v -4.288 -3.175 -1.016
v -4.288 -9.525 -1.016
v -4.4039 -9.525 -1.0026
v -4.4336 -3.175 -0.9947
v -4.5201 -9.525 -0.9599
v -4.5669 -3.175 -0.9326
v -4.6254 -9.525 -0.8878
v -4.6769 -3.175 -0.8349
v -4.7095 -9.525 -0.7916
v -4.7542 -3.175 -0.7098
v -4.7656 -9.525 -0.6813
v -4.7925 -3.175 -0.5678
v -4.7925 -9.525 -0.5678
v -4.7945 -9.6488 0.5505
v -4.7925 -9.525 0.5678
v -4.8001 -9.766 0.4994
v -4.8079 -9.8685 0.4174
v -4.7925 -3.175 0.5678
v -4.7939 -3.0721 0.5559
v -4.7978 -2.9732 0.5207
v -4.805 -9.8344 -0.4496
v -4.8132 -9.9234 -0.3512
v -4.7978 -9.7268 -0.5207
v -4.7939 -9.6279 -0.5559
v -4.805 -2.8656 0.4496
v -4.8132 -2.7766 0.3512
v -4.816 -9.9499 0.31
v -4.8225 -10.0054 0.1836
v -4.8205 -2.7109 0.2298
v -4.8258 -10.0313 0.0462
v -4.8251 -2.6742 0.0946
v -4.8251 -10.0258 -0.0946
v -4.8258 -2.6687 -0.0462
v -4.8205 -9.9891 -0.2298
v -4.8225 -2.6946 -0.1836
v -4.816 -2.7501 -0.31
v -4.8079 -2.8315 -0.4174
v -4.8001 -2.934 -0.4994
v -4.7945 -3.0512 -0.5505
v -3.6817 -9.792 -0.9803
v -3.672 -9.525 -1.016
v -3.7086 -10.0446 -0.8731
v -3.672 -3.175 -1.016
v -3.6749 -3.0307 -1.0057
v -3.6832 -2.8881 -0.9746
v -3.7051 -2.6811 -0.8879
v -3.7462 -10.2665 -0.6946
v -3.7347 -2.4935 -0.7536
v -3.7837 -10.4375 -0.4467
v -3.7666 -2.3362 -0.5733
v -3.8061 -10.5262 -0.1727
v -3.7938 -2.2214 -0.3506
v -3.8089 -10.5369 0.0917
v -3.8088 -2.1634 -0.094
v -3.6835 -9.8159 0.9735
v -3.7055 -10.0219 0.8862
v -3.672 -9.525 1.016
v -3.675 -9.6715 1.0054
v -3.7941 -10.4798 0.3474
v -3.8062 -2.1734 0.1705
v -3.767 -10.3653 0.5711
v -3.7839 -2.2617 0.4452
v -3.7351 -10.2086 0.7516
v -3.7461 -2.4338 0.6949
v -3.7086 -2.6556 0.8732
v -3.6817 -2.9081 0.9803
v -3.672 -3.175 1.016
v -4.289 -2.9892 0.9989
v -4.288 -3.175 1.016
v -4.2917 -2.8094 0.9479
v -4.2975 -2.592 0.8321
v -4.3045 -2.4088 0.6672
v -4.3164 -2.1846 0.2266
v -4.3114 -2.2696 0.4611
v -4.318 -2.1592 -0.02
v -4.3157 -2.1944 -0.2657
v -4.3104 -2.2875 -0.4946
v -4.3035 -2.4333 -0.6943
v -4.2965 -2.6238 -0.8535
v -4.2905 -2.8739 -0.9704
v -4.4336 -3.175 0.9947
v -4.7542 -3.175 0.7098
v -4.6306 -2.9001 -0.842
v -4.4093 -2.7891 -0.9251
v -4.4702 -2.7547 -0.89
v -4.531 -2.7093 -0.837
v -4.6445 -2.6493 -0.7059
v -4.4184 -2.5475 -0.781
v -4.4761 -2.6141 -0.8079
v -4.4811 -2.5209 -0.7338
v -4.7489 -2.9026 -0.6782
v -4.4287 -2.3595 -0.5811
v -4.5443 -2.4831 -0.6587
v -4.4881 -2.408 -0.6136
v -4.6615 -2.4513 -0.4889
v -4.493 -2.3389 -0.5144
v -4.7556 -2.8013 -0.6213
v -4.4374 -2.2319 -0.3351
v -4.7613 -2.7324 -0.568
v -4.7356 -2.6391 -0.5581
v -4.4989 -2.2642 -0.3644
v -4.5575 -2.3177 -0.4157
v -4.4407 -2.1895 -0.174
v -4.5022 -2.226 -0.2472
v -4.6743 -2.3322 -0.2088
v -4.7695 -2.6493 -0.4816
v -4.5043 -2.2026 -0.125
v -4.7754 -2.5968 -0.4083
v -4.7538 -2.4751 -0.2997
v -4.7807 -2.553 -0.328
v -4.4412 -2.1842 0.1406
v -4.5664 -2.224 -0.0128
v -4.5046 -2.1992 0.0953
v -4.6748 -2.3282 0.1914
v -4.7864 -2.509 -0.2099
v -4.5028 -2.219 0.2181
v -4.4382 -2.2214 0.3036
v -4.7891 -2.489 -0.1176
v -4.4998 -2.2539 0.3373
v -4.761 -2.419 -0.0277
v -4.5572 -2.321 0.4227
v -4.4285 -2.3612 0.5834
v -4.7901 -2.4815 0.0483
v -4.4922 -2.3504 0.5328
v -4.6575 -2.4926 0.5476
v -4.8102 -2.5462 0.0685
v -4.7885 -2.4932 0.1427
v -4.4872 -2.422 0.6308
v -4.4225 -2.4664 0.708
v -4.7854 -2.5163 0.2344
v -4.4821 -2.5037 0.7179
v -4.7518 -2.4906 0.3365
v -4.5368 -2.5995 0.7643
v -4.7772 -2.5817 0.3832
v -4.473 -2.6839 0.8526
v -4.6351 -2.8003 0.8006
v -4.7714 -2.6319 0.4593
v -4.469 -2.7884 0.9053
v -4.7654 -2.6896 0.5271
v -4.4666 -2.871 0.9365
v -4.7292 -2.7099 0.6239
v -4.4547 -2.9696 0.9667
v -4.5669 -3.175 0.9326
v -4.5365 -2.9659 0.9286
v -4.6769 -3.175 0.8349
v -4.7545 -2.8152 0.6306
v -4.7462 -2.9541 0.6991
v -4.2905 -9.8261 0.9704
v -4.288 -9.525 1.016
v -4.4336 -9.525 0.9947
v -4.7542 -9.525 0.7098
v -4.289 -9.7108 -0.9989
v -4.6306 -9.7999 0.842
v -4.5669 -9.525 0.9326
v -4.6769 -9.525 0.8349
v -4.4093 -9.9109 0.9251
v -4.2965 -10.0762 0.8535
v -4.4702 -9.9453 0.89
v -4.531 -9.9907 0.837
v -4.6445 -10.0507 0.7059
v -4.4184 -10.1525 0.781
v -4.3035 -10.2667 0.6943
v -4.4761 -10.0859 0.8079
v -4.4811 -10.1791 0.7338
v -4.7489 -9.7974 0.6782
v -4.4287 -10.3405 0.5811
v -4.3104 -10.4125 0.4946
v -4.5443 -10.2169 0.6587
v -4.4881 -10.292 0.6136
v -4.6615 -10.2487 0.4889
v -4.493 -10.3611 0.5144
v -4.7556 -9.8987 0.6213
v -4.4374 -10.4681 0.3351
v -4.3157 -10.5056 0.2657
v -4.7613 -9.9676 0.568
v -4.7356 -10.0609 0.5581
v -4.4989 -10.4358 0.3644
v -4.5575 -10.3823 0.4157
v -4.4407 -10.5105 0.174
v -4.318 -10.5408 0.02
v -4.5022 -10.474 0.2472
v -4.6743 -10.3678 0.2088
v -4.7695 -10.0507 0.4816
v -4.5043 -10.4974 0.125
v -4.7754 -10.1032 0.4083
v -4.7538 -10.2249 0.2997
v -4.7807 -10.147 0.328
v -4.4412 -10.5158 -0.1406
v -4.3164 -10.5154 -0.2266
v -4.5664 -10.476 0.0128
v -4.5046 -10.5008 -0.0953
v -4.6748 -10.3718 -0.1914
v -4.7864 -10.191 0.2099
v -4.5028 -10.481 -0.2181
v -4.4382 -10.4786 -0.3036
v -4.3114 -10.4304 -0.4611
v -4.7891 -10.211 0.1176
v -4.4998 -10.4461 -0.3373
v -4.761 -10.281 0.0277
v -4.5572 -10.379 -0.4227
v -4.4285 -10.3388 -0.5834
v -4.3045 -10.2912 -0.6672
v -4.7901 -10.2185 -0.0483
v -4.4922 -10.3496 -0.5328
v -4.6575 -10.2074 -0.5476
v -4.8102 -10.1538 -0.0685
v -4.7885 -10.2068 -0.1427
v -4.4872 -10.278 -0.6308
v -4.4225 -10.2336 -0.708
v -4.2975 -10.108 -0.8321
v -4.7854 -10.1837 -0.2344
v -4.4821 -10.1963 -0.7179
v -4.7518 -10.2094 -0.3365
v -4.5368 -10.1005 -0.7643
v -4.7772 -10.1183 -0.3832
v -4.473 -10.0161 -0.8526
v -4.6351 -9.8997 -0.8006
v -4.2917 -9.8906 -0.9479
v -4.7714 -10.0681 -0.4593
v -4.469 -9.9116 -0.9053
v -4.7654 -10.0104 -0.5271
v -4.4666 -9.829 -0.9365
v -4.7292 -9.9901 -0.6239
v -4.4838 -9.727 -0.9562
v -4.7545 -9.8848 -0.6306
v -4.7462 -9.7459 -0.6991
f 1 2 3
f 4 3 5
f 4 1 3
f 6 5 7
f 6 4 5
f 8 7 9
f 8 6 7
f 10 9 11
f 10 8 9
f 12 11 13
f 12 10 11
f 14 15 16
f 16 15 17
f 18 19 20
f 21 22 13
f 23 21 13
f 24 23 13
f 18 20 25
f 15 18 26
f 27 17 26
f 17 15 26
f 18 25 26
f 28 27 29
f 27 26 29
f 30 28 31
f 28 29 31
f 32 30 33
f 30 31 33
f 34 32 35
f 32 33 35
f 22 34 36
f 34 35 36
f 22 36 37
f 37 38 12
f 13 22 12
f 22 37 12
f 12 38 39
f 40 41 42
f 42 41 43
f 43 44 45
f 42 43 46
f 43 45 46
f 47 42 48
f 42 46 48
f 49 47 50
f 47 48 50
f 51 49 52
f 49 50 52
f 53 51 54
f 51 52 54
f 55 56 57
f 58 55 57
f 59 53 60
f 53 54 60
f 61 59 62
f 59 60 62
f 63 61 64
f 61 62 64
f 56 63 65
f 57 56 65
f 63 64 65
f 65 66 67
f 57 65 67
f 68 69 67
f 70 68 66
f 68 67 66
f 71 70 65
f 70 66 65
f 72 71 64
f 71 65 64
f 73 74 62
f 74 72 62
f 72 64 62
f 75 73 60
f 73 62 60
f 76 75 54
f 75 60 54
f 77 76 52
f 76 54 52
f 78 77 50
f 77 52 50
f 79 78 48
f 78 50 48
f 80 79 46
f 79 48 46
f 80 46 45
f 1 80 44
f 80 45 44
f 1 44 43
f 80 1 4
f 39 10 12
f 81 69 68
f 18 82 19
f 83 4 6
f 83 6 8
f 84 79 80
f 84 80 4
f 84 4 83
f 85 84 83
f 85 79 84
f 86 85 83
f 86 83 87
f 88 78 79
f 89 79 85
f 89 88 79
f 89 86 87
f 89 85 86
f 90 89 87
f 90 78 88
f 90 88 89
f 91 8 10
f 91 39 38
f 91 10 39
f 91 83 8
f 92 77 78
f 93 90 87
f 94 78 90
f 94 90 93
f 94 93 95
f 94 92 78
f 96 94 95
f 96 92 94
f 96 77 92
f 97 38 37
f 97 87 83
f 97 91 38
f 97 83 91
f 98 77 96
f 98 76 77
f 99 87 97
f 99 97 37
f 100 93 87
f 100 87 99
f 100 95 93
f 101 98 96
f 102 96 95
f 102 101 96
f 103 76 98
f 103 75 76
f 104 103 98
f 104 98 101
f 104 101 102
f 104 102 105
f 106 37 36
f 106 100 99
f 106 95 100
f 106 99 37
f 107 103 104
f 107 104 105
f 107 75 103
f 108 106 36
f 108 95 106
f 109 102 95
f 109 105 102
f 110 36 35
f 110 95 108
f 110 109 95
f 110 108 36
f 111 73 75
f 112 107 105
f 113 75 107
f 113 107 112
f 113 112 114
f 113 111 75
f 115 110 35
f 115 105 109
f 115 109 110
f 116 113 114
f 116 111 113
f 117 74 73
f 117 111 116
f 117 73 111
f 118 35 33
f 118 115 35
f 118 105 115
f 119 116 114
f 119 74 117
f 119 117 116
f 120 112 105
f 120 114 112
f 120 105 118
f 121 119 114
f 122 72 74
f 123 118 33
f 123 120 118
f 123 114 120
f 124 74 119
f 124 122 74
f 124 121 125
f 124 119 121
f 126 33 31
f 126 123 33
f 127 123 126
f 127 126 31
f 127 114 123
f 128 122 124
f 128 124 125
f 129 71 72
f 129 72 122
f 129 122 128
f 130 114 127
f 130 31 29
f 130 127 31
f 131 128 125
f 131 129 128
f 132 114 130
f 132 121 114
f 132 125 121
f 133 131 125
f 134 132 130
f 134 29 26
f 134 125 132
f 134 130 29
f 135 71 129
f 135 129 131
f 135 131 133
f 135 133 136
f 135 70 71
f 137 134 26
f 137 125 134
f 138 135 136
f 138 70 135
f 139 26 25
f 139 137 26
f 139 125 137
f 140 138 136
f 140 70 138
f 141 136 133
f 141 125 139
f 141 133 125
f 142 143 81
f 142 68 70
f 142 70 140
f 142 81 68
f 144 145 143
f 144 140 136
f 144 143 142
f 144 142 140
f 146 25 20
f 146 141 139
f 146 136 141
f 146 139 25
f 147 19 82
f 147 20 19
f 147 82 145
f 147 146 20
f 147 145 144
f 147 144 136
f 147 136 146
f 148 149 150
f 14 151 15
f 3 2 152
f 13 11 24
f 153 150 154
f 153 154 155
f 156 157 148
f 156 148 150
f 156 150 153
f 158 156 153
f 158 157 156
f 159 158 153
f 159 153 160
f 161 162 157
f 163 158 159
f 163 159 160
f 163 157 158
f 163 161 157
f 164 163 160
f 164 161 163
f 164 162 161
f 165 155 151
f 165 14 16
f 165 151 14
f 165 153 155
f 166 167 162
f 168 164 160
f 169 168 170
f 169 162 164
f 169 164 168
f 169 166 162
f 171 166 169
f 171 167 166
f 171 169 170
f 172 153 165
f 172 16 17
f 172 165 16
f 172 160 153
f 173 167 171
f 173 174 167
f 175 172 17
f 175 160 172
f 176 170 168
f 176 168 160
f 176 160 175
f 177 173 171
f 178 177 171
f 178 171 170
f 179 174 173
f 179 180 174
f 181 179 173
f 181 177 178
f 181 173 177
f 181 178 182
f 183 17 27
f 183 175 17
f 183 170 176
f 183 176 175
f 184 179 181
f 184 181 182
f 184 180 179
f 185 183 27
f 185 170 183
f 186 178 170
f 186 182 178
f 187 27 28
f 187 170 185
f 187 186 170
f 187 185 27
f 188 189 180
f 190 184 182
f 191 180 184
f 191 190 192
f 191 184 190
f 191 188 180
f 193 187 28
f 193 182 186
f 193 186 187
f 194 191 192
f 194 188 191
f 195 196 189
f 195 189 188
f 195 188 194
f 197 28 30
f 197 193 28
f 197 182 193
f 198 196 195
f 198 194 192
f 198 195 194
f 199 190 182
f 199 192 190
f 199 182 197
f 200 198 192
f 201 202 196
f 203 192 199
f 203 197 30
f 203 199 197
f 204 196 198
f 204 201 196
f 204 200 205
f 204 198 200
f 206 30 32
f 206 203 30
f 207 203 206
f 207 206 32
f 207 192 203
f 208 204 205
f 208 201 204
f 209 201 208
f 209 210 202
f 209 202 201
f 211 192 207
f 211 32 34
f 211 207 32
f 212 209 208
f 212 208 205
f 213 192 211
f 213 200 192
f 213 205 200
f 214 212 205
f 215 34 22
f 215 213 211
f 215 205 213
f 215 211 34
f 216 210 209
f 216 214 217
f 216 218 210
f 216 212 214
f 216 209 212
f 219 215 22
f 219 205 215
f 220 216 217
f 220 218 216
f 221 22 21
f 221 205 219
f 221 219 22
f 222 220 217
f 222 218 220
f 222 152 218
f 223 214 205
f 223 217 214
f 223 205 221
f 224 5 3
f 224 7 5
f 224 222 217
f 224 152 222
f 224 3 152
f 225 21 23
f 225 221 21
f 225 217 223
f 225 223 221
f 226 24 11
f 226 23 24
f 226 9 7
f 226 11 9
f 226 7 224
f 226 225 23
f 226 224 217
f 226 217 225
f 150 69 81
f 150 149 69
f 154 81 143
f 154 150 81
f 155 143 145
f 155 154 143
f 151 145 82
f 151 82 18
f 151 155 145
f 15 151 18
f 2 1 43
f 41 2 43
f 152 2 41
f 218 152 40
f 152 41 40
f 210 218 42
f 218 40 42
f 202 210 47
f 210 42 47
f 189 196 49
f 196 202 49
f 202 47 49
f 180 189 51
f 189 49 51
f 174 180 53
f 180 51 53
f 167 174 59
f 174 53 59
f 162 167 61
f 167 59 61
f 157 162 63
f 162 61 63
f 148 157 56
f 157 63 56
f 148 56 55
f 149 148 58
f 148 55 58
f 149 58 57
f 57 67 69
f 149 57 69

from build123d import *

# Parameters (mm, degrees)
F1_DEPTH = 12.7
F3_DEPTH = 25.4
F4_R     = 0.508


with BuildPart() as f1:
    # F0 (on Front) → F1 (new body)
    with BuildSketch(Plane.XZ):
        with BuildLine():
            ThreePointArc((-3.672035, -1.016), (-3.81, 0), (-3.672035, 1.016))
            Line((-3.672035, 1.016), (-4.717841, 1.016))
            ThreePointArc((-4.717841, 1.016), (-4.826, 0), (-4.717841, -1.016))
            Line((-4.717841, -1.016), (-3.672035, -1.016))
        make_face()
    extrude(amount=F1_DEPTH)

    # F2 (on Right) → F3 (cut)
    with BuildSketch(Plane.YZ):
        with BuildLine():
            Line((-12.7, 1.016), (-12.7, 0))
            Line((-12.7, 0), (-12.7, -1.016))
            Line((-12.7, -1.016), (-9.525, -1.016))
            ThreePointArc((-9.525, -1.016), (-10.541, 0), (-9.525, 1.016))
            Line((-9.525, 1.016), (-12.7, 1.016))
        make_face()
        with BuildLine():
            ThreePointArc((-3.175, 1.016), (-2.159, 0), (-3.175, -1.016))
            Line((-3.175, -1.016), (0, -1.016))
            Line((0, -1.016), (0, 1.016))
            Line((0, 1.016), (-3.175, 1.016))
        make_face()
    extrude(amount=-F3_DEPTH, mode=Mode.SUBTRACT)

    # F4
    f4_edges = [f1.edges().sort_by_distance(p)[0] for p in [
        (-4.717841, -6.35, 1.016),
    ]]
    fillet(f4_edges, radius=F4_R)


solid = f1.part
